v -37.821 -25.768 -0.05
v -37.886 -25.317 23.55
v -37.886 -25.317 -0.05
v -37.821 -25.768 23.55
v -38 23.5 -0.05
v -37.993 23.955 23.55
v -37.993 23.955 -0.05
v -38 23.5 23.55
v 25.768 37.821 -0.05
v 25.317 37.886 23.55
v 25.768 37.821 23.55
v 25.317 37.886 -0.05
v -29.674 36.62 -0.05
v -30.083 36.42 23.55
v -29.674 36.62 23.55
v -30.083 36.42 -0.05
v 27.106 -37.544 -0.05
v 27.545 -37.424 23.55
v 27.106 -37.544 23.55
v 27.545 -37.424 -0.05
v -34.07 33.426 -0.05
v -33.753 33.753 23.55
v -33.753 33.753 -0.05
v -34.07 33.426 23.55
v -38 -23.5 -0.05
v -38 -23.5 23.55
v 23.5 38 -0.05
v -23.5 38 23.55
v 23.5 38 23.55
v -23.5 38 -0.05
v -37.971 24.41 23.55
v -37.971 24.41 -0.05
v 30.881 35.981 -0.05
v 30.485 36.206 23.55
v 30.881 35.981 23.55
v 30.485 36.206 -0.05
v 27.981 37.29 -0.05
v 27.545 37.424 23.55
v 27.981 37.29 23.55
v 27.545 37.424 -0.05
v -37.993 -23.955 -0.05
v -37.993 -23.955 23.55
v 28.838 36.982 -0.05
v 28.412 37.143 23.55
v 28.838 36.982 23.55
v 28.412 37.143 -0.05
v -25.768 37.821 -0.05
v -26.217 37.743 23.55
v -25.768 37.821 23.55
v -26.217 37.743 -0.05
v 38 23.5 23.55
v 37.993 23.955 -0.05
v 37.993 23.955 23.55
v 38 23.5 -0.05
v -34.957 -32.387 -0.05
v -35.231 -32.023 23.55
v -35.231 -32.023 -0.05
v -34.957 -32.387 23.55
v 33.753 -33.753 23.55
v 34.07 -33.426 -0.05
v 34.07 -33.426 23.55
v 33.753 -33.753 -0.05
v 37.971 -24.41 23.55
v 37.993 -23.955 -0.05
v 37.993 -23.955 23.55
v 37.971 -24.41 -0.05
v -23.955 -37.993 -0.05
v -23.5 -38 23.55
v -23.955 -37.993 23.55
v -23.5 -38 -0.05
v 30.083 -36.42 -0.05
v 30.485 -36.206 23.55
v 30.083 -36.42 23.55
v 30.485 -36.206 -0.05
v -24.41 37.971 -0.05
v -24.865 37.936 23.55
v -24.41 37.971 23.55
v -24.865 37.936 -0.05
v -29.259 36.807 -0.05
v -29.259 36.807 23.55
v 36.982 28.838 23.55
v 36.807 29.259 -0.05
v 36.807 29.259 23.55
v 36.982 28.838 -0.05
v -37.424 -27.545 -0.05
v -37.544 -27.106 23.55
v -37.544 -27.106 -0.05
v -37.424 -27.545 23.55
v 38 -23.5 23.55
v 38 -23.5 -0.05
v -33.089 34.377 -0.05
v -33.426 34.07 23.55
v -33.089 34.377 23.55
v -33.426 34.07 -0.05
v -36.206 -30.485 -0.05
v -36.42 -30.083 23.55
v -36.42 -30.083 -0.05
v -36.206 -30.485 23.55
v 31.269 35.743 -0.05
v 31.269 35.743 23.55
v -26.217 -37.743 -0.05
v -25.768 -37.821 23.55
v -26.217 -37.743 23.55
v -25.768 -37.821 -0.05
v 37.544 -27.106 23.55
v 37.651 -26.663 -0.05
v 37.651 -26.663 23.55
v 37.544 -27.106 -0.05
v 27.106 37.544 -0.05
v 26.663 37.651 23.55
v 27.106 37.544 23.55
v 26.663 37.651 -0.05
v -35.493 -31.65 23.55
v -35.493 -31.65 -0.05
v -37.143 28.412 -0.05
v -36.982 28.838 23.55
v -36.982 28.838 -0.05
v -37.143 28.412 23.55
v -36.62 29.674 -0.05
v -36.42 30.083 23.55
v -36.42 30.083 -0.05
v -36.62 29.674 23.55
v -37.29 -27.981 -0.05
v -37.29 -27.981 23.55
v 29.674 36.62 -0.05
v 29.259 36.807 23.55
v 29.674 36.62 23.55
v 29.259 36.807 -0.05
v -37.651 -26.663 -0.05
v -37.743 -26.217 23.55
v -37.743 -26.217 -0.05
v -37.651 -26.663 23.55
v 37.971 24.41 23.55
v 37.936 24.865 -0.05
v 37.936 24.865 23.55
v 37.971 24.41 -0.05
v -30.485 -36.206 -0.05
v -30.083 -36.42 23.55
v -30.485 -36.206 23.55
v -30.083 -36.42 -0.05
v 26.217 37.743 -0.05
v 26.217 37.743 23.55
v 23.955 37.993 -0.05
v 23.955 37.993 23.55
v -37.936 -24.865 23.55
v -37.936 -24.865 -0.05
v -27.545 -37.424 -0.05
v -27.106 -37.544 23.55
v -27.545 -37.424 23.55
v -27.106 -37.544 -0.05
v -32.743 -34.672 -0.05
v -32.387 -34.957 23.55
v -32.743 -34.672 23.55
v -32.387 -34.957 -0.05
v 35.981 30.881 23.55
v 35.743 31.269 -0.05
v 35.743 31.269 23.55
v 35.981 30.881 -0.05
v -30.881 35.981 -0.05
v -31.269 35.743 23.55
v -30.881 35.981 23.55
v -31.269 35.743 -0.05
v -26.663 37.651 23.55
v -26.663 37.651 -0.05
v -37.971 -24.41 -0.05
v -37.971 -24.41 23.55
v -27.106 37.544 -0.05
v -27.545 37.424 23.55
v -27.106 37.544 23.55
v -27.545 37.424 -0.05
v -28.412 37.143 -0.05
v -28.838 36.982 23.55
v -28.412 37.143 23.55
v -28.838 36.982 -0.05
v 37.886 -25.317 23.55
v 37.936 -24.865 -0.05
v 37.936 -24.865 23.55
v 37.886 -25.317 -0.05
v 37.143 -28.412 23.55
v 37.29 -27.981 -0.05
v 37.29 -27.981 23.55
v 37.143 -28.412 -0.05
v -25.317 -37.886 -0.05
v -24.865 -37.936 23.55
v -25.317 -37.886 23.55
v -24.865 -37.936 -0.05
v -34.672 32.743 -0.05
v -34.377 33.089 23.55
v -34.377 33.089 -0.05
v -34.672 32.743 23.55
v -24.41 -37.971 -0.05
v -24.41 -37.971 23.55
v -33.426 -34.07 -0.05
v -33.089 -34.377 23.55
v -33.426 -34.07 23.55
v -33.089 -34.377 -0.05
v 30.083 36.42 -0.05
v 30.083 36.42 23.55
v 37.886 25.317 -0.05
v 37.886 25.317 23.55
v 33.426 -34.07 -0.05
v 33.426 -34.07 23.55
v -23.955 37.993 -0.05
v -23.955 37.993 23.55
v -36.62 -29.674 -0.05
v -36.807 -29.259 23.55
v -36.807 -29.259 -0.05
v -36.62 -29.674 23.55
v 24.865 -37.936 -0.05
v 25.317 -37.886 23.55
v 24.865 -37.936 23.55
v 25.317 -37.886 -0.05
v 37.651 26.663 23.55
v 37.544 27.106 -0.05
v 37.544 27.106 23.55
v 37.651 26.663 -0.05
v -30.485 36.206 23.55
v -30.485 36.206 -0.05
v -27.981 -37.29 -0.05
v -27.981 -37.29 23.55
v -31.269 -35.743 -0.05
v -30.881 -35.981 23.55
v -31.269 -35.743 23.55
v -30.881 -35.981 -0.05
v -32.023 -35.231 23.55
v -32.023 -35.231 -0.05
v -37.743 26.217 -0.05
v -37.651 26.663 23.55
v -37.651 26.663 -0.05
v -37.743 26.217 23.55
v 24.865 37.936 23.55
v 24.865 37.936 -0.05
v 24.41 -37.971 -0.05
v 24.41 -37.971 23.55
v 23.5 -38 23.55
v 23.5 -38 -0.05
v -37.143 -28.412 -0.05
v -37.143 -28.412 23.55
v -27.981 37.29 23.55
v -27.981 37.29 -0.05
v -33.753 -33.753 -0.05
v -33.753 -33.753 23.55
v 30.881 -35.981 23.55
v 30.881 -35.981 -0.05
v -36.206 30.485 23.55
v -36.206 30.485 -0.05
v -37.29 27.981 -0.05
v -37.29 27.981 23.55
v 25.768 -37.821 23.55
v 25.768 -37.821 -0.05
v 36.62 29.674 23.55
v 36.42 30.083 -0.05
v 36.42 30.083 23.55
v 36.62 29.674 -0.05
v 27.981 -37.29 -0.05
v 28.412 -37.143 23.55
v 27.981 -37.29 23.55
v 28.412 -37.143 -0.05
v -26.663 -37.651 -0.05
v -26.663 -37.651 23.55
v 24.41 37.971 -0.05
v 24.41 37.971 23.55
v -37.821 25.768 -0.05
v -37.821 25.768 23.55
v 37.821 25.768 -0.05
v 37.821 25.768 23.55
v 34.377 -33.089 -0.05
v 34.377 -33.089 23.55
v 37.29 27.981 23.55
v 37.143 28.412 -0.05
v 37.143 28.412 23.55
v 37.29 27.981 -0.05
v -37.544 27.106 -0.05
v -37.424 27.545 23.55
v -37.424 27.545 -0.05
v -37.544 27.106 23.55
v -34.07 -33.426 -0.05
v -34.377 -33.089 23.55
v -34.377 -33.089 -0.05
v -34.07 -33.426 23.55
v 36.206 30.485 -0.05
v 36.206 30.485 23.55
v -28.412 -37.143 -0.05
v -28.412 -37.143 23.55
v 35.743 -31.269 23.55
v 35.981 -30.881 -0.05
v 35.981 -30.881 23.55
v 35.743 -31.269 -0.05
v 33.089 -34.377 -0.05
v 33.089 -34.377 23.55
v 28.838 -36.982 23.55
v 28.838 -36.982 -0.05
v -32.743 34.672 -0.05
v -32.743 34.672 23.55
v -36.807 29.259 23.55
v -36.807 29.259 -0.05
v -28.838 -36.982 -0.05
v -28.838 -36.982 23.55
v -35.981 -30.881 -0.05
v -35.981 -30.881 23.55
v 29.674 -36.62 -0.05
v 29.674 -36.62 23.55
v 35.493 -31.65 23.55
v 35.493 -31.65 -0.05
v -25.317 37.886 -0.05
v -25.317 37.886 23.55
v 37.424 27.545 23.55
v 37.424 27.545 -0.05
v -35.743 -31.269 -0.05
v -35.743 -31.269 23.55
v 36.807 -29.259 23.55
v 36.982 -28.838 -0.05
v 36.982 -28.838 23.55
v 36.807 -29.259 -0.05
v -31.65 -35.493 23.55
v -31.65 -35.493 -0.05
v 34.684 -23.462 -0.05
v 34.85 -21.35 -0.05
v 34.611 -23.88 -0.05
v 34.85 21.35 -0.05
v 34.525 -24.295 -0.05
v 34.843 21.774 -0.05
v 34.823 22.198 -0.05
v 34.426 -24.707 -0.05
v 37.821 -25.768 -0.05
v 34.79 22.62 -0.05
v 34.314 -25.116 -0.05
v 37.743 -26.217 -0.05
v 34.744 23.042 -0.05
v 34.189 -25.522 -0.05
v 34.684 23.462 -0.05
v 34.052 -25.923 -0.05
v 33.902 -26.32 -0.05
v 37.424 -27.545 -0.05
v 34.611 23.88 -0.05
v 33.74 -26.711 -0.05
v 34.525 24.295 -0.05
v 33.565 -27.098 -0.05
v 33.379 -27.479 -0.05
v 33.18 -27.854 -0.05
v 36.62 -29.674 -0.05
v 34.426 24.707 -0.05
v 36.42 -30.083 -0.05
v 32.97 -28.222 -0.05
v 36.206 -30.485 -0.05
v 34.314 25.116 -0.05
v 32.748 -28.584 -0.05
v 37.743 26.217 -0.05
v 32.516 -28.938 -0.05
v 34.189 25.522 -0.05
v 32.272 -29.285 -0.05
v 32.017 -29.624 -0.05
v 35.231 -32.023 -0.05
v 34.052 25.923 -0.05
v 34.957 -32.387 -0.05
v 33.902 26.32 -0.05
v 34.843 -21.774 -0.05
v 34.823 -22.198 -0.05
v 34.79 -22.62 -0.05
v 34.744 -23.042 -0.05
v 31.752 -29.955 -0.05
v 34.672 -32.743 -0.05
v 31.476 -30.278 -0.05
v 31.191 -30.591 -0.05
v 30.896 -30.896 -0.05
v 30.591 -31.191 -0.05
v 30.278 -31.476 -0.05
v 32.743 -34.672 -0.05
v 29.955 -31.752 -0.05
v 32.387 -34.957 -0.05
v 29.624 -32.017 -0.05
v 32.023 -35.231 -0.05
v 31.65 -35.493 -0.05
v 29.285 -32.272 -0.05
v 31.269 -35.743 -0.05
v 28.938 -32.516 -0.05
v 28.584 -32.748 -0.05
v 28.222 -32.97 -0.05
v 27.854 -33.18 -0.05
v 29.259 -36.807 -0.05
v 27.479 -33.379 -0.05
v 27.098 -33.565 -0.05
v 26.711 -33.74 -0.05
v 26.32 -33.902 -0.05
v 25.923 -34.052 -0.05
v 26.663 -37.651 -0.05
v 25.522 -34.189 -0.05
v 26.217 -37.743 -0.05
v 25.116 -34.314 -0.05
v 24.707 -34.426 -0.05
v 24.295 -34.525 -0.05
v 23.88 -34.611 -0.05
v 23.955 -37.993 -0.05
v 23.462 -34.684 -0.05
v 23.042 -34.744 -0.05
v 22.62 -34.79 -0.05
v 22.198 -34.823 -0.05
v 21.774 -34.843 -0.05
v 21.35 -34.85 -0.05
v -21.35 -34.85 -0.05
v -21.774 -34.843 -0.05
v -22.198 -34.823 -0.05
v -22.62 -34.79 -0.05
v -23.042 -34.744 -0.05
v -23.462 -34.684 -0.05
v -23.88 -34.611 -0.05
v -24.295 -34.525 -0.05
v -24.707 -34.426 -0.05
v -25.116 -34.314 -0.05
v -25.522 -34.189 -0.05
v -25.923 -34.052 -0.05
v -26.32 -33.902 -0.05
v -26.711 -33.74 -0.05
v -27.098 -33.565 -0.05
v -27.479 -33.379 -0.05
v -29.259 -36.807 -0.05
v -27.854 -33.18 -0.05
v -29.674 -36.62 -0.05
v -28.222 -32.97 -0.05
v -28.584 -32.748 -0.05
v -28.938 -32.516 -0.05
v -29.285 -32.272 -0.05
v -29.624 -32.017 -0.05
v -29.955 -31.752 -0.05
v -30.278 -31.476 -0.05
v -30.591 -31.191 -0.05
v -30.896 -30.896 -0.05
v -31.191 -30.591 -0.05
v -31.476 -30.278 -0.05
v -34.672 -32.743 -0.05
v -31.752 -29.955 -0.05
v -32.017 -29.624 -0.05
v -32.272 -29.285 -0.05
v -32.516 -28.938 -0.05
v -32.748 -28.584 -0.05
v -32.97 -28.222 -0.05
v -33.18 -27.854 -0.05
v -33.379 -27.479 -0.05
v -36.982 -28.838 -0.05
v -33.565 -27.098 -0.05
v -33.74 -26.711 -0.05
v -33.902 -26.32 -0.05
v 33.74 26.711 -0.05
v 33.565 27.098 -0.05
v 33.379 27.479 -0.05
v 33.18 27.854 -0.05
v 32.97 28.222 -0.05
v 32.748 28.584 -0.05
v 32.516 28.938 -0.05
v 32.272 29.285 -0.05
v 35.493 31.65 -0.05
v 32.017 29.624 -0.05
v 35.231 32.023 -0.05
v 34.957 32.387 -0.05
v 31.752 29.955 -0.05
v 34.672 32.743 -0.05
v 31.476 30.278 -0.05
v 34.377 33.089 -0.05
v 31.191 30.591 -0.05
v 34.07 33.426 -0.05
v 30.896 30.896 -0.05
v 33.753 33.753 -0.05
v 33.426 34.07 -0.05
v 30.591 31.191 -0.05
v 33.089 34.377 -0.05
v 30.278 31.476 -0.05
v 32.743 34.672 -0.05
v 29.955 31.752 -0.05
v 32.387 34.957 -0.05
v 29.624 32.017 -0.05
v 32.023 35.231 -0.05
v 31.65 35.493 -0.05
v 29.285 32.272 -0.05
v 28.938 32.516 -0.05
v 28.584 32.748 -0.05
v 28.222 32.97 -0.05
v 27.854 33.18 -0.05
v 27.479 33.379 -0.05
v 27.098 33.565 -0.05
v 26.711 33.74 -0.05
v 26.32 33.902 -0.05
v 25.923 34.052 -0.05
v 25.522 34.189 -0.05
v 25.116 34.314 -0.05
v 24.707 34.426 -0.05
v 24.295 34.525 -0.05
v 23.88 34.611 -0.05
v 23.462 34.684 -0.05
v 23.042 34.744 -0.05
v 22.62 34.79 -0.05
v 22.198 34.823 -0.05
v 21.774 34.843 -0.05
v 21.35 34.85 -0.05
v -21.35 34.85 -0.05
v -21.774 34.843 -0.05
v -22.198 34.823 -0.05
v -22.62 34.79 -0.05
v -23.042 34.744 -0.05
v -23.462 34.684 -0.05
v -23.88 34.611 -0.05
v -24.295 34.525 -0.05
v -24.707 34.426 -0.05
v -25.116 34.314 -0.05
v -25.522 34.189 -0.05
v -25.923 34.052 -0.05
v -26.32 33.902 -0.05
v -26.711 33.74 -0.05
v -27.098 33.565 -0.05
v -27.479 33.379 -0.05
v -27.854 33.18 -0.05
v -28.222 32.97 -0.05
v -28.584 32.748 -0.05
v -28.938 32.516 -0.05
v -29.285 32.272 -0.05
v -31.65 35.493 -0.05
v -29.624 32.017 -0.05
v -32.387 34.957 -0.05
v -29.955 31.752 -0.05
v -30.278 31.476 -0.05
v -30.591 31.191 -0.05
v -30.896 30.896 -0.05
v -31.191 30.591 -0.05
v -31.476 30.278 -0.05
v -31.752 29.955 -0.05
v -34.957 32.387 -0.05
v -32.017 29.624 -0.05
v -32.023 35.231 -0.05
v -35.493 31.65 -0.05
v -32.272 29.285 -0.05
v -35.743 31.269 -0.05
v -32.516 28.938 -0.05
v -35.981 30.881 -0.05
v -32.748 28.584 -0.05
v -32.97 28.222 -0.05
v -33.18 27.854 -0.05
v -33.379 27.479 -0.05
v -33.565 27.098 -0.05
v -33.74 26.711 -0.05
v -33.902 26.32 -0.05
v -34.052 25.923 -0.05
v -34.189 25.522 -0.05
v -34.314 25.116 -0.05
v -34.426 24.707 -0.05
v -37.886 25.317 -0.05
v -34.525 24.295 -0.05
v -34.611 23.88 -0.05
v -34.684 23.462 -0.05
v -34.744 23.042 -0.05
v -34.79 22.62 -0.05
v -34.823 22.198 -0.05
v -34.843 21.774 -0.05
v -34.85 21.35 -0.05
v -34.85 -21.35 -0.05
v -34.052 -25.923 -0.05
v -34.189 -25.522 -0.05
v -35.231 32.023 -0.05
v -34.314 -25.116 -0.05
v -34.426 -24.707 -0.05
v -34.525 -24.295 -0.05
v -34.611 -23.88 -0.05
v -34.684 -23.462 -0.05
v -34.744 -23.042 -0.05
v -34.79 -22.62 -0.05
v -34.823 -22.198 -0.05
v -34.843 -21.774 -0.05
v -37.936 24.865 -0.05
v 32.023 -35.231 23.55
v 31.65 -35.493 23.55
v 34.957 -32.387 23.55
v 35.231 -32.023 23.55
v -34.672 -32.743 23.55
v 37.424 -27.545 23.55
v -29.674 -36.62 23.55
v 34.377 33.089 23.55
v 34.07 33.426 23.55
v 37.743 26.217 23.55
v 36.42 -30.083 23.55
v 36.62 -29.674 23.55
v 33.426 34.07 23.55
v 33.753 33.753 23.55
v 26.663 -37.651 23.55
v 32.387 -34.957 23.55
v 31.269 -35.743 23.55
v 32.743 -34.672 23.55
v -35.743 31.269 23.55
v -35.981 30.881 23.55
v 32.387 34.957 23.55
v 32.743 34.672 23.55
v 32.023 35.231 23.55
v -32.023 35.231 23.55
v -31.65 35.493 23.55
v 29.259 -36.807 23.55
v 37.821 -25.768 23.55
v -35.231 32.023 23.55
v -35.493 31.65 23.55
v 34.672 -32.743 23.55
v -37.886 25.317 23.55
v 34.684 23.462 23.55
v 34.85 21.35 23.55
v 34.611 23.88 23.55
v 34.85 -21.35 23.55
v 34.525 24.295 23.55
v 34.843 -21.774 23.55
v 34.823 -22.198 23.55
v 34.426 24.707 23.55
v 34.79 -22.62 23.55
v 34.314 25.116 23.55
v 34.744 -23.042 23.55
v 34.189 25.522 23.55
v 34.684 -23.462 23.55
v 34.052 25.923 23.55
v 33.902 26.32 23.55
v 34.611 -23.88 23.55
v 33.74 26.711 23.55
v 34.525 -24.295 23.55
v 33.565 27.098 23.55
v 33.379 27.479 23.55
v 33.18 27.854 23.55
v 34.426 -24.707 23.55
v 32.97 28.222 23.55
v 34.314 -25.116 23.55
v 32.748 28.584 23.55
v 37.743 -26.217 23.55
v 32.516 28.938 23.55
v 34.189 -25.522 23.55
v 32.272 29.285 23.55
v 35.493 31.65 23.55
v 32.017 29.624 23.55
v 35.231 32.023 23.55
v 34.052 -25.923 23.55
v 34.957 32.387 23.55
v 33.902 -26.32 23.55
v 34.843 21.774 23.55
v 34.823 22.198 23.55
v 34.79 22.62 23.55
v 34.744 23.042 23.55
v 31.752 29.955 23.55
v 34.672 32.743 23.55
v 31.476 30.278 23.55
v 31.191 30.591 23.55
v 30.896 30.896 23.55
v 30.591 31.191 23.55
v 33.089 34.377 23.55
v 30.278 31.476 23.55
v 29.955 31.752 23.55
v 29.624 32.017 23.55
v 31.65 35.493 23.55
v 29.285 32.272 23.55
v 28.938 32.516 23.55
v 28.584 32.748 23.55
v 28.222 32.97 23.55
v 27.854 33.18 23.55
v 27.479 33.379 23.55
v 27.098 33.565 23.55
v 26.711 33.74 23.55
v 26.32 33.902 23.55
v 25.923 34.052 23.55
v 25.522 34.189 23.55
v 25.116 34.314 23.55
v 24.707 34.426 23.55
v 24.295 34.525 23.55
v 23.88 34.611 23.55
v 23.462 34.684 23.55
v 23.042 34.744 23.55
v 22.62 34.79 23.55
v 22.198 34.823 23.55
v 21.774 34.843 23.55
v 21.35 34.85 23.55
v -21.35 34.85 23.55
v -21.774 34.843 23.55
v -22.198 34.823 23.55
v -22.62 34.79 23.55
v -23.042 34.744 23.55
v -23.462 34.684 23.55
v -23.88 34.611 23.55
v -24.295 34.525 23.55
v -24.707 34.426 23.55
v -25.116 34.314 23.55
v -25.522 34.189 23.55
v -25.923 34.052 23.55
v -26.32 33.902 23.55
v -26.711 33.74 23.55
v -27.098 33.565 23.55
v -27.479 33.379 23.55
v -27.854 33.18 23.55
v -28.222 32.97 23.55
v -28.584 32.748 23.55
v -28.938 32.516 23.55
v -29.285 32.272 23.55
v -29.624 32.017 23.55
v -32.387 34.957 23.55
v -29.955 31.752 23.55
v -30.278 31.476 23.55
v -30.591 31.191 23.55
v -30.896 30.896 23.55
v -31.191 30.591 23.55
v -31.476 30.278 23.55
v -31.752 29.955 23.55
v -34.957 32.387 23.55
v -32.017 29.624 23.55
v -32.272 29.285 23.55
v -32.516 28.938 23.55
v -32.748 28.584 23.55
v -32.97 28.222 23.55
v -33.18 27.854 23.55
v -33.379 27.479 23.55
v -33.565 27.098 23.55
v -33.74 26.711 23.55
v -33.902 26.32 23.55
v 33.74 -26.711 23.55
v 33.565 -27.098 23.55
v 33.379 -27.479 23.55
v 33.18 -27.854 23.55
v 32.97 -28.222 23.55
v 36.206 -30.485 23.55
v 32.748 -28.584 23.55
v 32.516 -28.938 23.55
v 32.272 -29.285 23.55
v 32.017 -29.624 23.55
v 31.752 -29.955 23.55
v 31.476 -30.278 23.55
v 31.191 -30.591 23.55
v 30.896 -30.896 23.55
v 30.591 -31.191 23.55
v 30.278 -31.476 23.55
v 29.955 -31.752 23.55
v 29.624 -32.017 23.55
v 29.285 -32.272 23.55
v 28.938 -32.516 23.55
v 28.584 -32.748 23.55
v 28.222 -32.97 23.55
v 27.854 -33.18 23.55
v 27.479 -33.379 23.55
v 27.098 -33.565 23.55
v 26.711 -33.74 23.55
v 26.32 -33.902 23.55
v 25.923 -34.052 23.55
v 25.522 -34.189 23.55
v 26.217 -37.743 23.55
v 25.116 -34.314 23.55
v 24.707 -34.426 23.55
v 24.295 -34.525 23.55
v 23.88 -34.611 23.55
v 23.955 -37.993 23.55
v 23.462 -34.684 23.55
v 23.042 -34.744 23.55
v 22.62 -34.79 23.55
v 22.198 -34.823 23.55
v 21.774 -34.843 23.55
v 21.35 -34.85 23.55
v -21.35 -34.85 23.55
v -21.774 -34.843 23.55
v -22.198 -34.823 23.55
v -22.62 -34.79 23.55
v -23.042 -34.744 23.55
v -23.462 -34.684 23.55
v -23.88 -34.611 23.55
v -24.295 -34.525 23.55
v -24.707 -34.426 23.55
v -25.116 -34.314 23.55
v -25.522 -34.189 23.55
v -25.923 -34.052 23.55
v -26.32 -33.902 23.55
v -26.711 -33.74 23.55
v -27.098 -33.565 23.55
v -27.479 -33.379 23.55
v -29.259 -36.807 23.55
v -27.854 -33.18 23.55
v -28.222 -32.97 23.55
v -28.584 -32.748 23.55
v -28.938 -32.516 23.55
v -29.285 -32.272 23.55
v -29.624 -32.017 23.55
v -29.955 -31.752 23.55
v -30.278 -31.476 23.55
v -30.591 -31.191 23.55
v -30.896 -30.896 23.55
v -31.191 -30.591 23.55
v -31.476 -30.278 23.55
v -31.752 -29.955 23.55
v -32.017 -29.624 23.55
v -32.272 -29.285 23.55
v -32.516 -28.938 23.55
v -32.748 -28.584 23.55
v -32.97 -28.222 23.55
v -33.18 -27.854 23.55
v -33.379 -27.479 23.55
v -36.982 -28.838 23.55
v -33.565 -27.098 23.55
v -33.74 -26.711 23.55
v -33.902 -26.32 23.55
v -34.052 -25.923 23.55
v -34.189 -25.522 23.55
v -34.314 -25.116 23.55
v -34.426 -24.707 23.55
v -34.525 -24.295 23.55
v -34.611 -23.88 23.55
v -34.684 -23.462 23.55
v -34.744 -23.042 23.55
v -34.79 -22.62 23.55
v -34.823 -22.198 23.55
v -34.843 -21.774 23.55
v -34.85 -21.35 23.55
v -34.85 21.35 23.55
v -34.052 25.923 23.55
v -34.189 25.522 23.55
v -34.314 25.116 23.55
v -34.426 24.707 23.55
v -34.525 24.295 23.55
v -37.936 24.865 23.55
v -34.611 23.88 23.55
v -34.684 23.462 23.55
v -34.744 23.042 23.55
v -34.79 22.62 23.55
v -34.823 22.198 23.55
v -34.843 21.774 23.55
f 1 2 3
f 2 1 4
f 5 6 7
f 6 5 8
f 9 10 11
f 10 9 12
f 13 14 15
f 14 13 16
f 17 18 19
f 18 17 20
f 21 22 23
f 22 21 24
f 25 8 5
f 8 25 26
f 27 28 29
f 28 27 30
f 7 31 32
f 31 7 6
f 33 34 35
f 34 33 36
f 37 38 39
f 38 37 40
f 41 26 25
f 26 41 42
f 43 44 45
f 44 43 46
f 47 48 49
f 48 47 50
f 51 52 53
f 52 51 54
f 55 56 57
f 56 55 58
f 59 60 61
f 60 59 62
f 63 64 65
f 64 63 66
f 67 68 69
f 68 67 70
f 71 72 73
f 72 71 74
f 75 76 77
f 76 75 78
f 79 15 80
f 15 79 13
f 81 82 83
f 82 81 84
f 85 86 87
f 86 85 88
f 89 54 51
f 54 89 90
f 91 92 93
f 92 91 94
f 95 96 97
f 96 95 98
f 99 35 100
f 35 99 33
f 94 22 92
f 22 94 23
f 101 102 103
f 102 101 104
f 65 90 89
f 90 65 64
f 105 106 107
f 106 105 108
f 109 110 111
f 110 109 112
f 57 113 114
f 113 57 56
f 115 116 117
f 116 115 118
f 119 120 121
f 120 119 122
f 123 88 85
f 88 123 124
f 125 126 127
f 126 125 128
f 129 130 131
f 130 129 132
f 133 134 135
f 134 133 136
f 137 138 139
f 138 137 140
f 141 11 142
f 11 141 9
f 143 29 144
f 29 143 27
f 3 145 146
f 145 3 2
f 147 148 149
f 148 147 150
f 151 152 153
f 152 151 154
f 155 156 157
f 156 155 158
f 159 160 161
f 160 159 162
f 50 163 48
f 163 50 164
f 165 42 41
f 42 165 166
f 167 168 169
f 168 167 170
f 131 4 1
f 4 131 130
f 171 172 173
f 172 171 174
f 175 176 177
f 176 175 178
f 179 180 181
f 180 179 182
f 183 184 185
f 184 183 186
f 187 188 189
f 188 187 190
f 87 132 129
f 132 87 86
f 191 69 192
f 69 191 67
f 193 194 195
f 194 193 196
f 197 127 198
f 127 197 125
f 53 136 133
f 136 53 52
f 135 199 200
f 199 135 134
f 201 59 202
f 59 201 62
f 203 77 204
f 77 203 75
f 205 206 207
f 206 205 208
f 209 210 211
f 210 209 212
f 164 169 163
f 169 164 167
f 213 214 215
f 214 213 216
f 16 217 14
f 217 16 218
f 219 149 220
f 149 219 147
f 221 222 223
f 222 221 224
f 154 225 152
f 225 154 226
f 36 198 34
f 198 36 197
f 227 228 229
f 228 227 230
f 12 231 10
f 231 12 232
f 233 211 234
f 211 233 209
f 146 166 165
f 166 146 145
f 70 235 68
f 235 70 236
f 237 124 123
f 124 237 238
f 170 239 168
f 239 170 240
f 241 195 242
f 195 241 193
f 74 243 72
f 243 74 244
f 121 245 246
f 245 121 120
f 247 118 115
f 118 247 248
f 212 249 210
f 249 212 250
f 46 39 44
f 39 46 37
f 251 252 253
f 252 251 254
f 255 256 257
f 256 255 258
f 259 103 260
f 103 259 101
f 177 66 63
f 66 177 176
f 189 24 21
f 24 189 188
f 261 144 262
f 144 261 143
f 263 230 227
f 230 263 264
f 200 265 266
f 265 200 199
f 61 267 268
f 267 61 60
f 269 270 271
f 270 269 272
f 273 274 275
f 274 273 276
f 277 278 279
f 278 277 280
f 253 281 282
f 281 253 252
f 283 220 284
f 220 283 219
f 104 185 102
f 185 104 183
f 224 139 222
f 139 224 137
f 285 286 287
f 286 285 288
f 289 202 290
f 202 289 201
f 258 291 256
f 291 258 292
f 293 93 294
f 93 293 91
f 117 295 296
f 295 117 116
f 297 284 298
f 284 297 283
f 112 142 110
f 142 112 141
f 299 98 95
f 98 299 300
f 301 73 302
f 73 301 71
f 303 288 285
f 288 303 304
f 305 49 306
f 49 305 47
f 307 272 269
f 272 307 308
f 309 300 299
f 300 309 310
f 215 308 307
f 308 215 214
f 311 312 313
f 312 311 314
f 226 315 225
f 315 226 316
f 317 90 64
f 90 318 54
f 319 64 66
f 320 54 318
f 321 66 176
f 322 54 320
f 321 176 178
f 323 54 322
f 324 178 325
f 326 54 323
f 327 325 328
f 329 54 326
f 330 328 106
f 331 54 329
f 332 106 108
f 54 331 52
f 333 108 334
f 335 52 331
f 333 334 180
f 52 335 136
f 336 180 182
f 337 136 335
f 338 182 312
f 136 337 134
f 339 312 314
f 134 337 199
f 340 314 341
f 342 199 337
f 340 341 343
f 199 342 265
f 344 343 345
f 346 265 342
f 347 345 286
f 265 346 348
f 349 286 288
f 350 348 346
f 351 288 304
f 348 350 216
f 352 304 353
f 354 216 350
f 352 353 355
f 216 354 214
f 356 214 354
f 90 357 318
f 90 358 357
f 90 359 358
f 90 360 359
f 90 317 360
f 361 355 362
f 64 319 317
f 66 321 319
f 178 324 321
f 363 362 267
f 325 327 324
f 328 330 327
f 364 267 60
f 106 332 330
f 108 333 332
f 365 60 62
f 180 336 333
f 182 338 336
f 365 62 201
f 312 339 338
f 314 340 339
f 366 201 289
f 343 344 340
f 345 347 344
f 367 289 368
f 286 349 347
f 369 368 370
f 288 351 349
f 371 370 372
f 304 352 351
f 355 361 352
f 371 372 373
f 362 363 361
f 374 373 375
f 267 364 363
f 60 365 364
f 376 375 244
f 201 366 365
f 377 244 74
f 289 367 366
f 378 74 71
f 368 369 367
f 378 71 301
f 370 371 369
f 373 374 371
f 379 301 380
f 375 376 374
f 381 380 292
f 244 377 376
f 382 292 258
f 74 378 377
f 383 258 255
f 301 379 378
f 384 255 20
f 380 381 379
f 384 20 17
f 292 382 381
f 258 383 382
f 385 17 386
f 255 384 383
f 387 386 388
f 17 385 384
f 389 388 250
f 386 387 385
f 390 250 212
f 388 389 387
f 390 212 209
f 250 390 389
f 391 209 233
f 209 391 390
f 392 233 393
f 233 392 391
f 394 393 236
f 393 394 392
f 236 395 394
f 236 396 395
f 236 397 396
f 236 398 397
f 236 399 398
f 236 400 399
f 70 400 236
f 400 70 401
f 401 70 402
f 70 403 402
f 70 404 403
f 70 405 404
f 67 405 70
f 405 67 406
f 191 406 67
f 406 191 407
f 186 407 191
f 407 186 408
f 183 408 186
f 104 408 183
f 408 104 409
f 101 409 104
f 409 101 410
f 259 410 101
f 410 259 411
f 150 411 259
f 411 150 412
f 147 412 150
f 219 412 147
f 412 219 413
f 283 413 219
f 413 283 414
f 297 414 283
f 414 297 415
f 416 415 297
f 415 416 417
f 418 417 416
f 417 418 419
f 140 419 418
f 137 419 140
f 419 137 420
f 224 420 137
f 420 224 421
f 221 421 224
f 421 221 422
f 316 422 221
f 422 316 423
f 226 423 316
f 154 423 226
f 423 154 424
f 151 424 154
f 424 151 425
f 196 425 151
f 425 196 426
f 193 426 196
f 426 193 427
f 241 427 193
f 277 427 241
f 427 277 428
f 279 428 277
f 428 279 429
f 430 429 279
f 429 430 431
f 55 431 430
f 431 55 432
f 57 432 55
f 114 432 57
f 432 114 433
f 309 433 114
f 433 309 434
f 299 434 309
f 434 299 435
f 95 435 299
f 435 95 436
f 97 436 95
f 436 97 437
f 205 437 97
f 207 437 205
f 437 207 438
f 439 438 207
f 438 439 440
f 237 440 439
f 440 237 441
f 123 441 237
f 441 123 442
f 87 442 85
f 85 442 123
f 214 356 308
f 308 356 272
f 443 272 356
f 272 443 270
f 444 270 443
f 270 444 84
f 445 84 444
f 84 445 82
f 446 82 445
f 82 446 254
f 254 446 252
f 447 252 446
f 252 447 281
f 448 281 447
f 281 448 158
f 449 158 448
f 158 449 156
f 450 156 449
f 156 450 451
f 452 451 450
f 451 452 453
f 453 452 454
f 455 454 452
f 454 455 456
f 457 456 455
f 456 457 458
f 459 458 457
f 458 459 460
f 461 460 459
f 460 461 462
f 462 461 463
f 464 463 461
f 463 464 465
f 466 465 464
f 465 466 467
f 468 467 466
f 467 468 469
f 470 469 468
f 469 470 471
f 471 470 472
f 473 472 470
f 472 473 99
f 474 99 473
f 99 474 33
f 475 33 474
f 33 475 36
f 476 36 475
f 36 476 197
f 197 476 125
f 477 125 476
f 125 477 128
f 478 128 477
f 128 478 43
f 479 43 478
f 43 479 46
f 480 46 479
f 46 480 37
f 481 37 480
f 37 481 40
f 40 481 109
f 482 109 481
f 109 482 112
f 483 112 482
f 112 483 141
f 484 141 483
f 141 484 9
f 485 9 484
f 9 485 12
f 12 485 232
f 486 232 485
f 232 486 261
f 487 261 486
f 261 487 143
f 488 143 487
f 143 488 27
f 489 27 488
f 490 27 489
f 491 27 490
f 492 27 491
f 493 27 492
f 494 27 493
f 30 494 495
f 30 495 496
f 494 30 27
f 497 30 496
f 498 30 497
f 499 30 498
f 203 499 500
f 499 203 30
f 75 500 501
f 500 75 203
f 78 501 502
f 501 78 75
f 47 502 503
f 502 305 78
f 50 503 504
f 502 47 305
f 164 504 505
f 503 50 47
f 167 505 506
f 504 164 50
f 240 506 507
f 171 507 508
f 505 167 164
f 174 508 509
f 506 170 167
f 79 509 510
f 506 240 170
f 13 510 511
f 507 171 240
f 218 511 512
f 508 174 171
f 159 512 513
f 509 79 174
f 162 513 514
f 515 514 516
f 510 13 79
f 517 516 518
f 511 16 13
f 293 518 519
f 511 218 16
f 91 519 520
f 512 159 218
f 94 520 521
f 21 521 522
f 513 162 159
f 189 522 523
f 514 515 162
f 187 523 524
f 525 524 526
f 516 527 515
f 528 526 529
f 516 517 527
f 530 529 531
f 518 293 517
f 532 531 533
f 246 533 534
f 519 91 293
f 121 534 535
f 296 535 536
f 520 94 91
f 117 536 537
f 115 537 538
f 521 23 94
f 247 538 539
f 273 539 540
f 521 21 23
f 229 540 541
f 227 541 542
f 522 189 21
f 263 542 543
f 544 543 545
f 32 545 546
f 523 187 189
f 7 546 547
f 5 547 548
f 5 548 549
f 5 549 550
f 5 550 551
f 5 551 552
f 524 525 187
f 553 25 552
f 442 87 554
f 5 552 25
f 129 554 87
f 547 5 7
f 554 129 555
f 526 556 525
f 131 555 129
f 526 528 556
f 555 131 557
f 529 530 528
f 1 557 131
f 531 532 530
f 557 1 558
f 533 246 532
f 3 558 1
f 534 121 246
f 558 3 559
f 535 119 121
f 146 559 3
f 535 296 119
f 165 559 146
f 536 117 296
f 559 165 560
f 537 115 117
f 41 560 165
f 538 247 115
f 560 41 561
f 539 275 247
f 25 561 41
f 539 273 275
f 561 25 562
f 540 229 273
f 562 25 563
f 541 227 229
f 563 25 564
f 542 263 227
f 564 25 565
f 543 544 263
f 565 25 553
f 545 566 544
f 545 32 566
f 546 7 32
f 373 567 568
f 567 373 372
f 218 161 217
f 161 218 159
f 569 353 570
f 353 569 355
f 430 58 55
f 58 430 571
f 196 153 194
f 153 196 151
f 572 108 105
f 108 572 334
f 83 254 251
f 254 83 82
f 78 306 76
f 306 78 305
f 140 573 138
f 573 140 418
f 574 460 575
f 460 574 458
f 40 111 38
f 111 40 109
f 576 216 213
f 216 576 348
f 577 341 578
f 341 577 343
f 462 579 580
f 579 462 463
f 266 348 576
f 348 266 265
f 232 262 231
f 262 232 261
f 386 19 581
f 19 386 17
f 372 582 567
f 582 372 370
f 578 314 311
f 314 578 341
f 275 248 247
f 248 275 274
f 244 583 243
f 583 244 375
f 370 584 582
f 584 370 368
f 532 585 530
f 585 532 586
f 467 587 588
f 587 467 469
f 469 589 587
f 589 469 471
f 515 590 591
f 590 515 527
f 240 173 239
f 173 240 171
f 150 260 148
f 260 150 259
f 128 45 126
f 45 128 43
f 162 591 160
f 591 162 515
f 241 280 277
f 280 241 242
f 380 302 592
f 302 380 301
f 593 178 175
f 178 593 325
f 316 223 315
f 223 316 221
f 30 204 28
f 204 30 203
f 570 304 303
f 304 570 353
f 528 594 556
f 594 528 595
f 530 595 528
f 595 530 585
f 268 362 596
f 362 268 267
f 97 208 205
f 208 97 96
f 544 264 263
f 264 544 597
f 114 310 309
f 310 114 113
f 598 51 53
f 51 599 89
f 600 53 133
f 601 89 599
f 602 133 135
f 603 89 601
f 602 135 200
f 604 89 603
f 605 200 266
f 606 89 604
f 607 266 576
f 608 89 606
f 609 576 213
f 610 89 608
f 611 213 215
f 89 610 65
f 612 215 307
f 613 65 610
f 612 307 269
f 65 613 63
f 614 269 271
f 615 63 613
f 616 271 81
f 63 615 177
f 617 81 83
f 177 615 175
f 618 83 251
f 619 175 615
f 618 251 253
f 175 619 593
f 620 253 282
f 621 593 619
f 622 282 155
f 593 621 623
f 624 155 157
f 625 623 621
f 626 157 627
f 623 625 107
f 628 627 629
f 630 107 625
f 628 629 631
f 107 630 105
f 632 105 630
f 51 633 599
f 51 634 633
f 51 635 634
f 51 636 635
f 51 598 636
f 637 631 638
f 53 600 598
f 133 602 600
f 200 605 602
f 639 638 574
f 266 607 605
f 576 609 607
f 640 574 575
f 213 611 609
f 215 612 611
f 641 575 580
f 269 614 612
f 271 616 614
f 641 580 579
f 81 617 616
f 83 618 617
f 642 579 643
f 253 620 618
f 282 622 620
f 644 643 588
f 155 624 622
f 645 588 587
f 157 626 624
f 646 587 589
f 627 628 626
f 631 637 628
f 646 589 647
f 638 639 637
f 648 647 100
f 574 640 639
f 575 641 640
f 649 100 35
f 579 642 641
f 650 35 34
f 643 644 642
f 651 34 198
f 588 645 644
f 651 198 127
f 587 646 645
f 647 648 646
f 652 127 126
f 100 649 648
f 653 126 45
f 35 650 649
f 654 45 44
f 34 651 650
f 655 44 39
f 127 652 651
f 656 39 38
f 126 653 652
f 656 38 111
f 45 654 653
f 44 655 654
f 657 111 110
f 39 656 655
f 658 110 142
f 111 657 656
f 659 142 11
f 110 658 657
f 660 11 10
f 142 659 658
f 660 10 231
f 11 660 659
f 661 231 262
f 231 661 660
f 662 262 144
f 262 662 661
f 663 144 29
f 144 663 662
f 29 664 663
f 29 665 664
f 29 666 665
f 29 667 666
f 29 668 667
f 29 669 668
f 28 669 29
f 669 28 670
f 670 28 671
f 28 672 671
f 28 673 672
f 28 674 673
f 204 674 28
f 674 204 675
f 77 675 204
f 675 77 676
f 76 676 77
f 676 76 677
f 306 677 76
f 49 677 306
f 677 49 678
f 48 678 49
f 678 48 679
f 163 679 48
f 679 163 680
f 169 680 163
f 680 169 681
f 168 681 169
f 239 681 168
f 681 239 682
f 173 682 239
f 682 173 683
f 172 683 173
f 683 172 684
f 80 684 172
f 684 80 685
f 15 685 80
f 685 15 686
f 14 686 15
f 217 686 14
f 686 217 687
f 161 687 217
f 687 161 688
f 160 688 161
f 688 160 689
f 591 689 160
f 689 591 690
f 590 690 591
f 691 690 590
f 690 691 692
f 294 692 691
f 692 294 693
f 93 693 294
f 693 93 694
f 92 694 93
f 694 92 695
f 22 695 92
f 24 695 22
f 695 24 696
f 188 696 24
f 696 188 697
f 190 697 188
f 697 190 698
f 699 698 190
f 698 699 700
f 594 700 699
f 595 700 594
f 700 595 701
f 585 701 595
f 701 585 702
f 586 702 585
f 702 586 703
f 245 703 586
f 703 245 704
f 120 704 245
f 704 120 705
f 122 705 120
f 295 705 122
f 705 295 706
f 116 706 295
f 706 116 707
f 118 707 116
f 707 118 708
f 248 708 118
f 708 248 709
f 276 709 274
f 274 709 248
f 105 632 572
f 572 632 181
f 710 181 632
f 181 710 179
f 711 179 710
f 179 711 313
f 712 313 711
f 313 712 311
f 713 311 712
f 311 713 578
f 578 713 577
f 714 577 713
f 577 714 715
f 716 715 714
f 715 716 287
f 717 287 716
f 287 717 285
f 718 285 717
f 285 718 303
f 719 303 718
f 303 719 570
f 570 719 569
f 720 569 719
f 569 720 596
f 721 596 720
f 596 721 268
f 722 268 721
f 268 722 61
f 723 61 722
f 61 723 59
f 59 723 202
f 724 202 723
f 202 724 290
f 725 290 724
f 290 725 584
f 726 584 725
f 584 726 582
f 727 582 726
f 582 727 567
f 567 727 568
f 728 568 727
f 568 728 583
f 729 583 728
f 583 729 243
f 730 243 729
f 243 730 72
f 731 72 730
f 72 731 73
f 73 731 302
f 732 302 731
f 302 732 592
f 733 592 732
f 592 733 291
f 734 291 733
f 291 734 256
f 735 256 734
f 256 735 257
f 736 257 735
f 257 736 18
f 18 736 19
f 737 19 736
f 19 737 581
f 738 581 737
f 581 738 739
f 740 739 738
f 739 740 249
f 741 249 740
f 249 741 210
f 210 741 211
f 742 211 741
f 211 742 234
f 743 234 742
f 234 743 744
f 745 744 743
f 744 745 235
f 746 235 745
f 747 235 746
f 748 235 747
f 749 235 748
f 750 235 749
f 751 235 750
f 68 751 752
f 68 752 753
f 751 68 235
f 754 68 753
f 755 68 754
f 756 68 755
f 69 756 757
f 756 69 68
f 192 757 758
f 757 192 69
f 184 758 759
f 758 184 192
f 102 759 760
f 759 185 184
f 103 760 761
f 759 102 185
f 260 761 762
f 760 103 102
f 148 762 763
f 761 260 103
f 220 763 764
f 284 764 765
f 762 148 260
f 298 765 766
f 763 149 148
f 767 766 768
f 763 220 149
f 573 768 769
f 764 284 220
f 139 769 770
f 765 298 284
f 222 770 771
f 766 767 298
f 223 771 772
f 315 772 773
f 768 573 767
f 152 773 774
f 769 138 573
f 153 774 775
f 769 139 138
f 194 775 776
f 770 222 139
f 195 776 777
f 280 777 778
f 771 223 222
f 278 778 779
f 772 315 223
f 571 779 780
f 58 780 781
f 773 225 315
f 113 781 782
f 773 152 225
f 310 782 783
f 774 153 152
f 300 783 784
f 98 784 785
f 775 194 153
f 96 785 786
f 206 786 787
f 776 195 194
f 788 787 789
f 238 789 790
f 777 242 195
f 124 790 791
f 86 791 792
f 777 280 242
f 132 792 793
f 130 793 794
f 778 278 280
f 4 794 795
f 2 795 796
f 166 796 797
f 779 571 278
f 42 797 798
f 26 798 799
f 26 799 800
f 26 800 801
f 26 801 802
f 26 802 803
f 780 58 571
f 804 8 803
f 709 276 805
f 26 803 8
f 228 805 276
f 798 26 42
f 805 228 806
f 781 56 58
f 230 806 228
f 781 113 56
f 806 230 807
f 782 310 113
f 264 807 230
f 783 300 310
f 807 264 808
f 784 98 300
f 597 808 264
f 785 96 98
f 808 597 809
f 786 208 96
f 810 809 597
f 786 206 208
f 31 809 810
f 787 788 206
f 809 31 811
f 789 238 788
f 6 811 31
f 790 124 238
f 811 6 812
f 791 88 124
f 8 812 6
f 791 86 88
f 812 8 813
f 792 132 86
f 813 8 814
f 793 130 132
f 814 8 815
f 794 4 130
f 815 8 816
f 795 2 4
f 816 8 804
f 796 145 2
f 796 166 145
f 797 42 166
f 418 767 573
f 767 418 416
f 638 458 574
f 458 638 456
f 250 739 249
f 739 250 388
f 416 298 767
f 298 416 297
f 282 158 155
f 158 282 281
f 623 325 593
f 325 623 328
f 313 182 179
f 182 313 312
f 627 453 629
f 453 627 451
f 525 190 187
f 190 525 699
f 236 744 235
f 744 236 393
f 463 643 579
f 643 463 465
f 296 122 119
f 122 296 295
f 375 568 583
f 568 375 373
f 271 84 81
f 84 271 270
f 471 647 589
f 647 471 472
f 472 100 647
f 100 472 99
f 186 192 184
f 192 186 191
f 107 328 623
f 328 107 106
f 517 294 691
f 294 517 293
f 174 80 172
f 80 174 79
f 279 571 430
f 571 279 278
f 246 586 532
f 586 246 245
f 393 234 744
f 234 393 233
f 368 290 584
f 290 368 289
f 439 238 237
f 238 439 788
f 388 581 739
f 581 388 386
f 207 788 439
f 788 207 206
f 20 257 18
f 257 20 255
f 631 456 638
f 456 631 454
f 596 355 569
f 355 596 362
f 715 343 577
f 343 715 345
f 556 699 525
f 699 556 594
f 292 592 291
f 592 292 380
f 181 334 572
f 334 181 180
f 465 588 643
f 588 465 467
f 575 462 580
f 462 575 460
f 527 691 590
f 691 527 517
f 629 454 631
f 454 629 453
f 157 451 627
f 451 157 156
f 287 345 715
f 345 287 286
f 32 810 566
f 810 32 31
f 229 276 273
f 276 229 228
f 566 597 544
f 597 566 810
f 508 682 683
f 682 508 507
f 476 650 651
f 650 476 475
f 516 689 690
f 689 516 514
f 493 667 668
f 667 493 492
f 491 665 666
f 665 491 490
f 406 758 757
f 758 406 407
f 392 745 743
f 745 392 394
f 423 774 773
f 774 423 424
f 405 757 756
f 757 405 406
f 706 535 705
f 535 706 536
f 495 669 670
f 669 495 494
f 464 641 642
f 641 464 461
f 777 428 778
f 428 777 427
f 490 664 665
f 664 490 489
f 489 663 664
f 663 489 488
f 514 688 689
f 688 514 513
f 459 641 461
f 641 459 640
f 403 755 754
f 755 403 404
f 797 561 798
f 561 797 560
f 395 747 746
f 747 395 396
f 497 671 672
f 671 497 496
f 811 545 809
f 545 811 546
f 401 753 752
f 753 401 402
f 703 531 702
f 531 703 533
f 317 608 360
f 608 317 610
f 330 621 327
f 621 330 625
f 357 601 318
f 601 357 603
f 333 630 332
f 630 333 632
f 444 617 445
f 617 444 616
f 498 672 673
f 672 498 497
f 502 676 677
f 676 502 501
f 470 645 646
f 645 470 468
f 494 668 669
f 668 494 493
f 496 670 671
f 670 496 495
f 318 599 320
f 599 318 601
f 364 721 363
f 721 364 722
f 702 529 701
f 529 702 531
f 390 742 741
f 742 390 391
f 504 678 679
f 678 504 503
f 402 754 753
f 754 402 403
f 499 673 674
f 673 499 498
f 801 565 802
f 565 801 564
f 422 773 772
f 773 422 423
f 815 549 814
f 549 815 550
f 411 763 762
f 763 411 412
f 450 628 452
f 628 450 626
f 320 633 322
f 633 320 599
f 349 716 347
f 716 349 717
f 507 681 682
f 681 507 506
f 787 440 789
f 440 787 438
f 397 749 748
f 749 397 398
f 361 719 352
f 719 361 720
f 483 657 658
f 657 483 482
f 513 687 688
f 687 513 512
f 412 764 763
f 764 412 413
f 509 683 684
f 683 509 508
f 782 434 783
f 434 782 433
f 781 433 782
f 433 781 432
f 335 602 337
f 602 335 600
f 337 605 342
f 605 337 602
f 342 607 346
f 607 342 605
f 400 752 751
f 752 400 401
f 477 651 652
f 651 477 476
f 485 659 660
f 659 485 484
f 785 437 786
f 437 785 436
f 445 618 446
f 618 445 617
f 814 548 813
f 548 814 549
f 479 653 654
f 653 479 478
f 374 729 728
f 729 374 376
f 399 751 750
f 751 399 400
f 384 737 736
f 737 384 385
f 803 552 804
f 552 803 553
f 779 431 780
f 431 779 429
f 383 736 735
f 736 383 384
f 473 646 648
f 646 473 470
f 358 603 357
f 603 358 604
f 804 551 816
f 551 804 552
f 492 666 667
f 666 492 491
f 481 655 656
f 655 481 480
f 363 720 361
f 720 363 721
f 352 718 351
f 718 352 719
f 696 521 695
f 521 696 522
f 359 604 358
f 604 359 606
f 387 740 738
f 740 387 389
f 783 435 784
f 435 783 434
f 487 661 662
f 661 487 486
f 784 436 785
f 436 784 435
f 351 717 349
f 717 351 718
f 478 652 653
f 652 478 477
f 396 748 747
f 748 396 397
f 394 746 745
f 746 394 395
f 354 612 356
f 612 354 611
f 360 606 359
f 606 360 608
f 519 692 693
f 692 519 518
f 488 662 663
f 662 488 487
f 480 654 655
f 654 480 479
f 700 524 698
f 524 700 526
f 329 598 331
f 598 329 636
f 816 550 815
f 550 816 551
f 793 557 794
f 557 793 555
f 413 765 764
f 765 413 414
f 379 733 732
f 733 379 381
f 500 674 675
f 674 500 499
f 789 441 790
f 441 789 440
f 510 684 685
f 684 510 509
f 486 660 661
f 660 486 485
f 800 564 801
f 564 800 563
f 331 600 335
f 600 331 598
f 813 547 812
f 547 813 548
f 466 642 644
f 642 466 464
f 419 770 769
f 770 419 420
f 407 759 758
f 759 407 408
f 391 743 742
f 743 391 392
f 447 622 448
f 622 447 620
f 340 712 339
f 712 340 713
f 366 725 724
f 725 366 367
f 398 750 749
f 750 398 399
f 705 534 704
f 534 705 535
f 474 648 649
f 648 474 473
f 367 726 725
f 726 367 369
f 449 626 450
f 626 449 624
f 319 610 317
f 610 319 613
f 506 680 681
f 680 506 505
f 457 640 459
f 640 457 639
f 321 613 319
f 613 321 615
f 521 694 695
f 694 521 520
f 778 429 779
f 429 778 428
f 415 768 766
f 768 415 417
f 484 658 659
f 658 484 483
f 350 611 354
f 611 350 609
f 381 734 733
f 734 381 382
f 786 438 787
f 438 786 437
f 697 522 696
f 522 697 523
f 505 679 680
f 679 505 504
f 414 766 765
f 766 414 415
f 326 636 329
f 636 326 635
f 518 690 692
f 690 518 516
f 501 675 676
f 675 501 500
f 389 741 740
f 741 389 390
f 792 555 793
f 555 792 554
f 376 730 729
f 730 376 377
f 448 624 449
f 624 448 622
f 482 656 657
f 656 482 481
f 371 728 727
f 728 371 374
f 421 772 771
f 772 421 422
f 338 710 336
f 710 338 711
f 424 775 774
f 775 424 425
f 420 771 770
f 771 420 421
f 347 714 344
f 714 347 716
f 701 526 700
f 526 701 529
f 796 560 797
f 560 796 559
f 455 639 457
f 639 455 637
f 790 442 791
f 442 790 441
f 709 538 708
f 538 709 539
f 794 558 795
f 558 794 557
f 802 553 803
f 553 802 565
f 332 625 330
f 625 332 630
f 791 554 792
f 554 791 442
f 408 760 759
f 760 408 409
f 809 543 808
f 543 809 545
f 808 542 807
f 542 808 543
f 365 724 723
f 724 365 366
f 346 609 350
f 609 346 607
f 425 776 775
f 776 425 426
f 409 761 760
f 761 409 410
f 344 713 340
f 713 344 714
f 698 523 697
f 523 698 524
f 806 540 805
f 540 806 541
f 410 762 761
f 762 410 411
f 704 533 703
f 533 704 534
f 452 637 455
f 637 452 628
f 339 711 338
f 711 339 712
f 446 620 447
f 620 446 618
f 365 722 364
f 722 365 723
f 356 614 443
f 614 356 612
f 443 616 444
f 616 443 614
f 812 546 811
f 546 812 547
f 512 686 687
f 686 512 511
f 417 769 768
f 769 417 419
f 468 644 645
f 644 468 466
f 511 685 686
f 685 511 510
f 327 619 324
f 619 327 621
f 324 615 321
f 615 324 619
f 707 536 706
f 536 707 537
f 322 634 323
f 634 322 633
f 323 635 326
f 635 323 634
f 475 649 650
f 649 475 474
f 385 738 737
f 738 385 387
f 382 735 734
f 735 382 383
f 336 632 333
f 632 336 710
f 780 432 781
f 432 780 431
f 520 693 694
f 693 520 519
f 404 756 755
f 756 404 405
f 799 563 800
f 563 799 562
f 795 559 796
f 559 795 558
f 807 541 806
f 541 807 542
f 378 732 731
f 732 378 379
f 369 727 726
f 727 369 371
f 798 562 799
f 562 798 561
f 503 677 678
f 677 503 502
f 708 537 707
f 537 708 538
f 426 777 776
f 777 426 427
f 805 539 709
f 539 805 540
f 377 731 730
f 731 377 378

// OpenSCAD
$fn=200;
// import("C://Users//quatz//Downloads//Blink_Outdoor_Camera_Hood.stl");

difference()
{
    //main
    minkowski()
    {
        cube([47,47,0.1], true);
        cylinder(r=14.5,h=23.5);
    };

    //cut
    minkowski()
    {
        cube([42.7,42.7,0.2], true);
        cylinder(r=13.5,h=23.5);
    }
}
